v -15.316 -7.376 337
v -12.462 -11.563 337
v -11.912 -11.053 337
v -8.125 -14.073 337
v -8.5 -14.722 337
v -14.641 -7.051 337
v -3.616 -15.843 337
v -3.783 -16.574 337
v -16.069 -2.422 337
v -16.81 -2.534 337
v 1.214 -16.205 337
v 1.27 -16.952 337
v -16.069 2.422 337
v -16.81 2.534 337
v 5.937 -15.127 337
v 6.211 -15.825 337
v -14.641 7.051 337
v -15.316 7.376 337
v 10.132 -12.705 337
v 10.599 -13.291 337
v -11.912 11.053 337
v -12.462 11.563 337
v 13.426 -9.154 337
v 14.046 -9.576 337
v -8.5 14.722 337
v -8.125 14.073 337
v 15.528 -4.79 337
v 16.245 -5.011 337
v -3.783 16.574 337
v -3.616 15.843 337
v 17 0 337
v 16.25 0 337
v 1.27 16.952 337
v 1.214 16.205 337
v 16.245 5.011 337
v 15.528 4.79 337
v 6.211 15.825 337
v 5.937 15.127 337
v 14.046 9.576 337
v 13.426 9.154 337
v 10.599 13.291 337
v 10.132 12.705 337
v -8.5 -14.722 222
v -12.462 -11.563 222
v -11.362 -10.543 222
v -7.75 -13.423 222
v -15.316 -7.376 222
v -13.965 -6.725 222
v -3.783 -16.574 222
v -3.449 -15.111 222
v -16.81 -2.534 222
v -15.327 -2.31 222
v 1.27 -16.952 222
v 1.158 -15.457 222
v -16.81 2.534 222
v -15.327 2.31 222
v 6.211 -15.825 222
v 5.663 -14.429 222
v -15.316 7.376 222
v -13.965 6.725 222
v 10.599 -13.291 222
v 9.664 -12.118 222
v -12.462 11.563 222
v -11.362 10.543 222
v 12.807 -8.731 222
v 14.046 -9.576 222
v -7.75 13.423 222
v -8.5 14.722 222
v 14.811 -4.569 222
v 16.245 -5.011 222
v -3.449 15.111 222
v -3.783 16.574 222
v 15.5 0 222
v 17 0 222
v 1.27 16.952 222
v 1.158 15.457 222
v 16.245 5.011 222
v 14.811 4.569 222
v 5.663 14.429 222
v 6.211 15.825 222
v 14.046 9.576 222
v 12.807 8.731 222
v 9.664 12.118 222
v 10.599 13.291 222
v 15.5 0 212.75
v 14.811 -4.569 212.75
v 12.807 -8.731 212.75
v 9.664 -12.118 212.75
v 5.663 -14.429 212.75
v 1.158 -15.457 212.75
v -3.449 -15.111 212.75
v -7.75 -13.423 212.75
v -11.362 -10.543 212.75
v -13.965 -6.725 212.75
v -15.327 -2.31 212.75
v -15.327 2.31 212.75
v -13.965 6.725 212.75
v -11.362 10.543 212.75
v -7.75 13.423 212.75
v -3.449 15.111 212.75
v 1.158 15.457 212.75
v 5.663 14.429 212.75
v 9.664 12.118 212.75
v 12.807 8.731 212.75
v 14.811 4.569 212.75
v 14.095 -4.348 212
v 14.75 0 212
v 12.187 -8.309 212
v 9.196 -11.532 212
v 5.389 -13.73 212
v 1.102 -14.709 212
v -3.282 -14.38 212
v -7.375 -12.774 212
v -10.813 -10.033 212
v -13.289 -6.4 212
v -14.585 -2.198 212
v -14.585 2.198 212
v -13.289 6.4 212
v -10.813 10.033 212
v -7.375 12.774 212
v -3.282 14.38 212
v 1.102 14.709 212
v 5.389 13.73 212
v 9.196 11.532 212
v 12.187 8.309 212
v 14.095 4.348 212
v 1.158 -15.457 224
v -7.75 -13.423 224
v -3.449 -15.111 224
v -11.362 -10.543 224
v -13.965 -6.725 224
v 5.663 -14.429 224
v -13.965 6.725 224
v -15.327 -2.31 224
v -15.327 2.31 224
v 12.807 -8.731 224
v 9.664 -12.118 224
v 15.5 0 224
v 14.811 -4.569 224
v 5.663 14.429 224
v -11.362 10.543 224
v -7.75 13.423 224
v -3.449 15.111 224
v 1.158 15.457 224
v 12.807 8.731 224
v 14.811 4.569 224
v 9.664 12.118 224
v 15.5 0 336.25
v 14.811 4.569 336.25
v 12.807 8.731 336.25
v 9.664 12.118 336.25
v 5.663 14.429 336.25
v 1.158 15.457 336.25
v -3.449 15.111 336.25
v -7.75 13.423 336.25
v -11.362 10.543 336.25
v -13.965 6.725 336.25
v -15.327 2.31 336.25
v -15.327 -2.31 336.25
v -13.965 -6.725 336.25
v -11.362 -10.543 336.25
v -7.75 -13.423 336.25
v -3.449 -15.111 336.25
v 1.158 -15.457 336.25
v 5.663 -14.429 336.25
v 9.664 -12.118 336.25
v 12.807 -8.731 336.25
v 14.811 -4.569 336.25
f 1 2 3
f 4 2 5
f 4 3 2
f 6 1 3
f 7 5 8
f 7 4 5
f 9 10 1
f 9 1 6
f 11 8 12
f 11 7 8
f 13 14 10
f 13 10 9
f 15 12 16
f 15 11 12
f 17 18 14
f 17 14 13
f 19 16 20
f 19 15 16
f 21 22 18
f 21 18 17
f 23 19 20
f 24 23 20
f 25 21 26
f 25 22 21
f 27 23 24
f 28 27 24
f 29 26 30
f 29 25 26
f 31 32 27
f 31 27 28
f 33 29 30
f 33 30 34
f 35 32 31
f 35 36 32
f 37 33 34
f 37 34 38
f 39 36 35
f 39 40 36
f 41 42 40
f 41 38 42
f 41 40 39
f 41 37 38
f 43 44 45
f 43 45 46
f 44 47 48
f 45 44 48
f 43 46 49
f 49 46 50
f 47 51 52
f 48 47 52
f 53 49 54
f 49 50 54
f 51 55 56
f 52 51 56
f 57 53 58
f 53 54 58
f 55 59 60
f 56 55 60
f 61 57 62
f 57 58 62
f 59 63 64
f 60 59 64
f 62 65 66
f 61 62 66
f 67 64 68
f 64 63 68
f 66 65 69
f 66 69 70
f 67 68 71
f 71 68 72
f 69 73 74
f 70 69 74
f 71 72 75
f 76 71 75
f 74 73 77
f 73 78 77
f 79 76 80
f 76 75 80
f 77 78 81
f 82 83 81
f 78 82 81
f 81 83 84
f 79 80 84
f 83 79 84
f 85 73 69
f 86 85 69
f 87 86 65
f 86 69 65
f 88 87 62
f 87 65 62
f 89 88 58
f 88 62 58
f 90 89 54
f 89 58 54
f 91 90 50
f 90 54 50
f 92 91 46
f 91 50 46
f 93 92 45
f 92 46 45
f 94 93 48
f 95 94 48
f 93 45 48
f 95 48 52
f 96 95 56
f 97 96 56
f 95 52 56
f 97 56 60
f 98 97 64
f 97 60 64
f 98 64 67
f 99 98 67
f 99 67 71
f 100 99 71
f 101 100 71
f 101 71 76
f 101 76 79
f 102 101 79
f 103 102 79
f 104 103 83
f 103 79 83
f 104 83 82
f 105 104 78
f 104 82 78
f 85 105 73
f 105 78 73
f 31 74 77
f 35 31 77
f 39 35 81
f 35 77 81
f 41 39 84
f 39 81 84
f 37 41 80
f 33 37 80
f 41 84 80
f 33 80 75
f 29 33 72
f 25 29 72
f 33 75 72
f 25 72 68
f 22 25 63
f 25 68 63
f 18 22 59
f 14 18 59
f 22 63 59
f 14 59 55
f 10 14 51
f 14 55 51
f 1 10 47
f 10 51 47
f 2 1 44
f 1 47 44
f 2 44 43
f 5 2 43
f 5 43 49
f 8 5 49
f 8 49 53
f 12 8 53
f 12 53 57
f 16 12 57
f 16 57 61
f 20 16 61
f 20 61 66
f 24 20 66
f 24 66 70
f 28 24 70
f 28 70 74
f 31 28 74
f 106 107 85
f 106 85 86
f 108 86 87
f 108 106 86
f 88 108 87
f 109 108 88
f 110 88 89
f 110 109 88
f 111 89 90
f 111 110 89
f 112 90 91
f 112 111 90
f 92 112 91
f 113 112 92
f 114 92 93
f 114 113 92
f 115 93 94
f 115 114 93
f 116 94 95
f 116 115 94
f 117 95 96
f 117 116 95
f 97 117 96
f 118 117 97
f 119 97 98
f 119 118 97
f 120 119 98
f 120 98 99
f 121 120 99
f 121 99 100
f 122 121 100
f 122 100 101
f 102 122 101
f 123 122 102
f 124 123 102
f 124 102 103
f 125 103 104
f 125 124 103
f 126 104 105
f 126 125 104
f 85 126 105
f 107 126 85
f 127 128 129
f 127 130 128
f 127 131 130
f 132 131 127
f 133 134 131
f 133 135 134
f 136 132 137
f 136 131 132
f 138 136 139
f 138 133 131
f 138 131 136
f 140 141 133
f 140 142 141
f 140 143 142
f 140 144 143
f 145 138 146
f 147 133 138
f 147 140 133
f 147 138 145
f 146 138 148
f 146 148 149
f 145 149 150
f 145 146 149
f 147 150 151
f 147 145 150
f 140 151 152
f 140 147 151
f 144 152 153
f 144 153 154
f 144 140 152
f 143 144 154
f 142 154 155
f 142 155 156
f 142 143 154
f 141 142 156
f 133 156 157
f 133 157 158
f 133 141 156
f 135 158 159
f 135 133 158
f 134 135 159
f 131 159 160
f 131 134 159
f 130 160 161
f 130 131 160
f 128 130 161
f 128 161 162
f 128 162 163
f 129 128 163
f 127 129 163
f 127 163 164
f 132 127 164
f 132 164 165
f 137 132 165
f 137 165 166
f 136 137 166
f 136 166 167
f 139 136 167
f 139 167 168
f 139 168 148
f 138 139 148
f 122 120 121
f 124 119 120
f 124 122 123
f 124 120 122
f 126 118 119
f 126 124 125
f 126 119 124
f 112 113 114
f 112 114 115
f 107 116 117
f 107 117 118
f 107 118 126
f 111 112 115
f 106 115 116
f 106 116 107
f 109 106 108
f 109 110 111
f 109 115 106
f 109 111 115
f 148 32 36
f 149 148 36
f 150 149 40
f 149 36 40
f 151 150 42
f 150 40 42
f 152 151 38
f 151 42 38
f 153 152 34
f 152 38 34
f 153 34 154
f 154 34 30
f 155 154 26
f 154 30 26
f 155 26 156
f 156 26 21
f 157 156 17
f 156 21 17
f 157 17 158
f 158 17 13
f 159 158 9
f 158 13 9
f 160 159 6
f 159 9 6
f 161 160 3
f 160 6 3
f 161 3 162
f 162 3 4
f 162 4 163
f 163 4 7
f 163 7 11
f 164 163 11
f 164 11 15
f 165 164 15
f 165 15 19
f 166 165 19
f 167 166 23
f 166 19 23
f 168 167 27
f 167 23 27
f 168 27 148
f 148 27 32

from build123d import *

# Parameters (mm, degrees)
F1_R     = 17
F1_R_2   = 15.5
F2_DEPTH = 115
F3_SIZE  = 0.75
F4_R     = 17
F5_DEPTH = 2
F6_R     = 15.5
F7_DEPTH = 10
F8_SIZE  = 0.75


with BuildPart() as f2:
    # F1 (on offset) → F2 (new body)
    with BuildSketch(Plane.XY.offset(222)):
        Circle(F1_R)
        Circle(F1_R_2, mode=Mode.SUBTRACT)
    extrude(amount=F2_DEPTH)

    # F3
    f3_edges = [f2.edges().sort_by_distance(p)[0] for p in [
        (-15.5, 0, 337),
    ]]
    chamfer(f3_edges, length=F3_SIZE)

    # F4 (on offset) → F5 (join)
    with BuildSketch(Plane.XY.offset(222)):
        Circle(F4_R)
    extrude(amount=F5_DEPTH)

    # F6 (on face) → F7 (join)
    with BuildSketch(Plane(origin=(0, 0, 222), x_dir=(1, 0, 0), z_dir=(0, 0, -1))):
        Circle(F6_R)
    extrude(amount=F7_DEPTH)

    # F8
    f8_edges = [f2.edges().sort_by_distance(p)[0] for p in [
        (-15.5, 0, 212),
    ]]
    chamfer(f8_edges, length=F8_SIZE)


solid = f2.part
